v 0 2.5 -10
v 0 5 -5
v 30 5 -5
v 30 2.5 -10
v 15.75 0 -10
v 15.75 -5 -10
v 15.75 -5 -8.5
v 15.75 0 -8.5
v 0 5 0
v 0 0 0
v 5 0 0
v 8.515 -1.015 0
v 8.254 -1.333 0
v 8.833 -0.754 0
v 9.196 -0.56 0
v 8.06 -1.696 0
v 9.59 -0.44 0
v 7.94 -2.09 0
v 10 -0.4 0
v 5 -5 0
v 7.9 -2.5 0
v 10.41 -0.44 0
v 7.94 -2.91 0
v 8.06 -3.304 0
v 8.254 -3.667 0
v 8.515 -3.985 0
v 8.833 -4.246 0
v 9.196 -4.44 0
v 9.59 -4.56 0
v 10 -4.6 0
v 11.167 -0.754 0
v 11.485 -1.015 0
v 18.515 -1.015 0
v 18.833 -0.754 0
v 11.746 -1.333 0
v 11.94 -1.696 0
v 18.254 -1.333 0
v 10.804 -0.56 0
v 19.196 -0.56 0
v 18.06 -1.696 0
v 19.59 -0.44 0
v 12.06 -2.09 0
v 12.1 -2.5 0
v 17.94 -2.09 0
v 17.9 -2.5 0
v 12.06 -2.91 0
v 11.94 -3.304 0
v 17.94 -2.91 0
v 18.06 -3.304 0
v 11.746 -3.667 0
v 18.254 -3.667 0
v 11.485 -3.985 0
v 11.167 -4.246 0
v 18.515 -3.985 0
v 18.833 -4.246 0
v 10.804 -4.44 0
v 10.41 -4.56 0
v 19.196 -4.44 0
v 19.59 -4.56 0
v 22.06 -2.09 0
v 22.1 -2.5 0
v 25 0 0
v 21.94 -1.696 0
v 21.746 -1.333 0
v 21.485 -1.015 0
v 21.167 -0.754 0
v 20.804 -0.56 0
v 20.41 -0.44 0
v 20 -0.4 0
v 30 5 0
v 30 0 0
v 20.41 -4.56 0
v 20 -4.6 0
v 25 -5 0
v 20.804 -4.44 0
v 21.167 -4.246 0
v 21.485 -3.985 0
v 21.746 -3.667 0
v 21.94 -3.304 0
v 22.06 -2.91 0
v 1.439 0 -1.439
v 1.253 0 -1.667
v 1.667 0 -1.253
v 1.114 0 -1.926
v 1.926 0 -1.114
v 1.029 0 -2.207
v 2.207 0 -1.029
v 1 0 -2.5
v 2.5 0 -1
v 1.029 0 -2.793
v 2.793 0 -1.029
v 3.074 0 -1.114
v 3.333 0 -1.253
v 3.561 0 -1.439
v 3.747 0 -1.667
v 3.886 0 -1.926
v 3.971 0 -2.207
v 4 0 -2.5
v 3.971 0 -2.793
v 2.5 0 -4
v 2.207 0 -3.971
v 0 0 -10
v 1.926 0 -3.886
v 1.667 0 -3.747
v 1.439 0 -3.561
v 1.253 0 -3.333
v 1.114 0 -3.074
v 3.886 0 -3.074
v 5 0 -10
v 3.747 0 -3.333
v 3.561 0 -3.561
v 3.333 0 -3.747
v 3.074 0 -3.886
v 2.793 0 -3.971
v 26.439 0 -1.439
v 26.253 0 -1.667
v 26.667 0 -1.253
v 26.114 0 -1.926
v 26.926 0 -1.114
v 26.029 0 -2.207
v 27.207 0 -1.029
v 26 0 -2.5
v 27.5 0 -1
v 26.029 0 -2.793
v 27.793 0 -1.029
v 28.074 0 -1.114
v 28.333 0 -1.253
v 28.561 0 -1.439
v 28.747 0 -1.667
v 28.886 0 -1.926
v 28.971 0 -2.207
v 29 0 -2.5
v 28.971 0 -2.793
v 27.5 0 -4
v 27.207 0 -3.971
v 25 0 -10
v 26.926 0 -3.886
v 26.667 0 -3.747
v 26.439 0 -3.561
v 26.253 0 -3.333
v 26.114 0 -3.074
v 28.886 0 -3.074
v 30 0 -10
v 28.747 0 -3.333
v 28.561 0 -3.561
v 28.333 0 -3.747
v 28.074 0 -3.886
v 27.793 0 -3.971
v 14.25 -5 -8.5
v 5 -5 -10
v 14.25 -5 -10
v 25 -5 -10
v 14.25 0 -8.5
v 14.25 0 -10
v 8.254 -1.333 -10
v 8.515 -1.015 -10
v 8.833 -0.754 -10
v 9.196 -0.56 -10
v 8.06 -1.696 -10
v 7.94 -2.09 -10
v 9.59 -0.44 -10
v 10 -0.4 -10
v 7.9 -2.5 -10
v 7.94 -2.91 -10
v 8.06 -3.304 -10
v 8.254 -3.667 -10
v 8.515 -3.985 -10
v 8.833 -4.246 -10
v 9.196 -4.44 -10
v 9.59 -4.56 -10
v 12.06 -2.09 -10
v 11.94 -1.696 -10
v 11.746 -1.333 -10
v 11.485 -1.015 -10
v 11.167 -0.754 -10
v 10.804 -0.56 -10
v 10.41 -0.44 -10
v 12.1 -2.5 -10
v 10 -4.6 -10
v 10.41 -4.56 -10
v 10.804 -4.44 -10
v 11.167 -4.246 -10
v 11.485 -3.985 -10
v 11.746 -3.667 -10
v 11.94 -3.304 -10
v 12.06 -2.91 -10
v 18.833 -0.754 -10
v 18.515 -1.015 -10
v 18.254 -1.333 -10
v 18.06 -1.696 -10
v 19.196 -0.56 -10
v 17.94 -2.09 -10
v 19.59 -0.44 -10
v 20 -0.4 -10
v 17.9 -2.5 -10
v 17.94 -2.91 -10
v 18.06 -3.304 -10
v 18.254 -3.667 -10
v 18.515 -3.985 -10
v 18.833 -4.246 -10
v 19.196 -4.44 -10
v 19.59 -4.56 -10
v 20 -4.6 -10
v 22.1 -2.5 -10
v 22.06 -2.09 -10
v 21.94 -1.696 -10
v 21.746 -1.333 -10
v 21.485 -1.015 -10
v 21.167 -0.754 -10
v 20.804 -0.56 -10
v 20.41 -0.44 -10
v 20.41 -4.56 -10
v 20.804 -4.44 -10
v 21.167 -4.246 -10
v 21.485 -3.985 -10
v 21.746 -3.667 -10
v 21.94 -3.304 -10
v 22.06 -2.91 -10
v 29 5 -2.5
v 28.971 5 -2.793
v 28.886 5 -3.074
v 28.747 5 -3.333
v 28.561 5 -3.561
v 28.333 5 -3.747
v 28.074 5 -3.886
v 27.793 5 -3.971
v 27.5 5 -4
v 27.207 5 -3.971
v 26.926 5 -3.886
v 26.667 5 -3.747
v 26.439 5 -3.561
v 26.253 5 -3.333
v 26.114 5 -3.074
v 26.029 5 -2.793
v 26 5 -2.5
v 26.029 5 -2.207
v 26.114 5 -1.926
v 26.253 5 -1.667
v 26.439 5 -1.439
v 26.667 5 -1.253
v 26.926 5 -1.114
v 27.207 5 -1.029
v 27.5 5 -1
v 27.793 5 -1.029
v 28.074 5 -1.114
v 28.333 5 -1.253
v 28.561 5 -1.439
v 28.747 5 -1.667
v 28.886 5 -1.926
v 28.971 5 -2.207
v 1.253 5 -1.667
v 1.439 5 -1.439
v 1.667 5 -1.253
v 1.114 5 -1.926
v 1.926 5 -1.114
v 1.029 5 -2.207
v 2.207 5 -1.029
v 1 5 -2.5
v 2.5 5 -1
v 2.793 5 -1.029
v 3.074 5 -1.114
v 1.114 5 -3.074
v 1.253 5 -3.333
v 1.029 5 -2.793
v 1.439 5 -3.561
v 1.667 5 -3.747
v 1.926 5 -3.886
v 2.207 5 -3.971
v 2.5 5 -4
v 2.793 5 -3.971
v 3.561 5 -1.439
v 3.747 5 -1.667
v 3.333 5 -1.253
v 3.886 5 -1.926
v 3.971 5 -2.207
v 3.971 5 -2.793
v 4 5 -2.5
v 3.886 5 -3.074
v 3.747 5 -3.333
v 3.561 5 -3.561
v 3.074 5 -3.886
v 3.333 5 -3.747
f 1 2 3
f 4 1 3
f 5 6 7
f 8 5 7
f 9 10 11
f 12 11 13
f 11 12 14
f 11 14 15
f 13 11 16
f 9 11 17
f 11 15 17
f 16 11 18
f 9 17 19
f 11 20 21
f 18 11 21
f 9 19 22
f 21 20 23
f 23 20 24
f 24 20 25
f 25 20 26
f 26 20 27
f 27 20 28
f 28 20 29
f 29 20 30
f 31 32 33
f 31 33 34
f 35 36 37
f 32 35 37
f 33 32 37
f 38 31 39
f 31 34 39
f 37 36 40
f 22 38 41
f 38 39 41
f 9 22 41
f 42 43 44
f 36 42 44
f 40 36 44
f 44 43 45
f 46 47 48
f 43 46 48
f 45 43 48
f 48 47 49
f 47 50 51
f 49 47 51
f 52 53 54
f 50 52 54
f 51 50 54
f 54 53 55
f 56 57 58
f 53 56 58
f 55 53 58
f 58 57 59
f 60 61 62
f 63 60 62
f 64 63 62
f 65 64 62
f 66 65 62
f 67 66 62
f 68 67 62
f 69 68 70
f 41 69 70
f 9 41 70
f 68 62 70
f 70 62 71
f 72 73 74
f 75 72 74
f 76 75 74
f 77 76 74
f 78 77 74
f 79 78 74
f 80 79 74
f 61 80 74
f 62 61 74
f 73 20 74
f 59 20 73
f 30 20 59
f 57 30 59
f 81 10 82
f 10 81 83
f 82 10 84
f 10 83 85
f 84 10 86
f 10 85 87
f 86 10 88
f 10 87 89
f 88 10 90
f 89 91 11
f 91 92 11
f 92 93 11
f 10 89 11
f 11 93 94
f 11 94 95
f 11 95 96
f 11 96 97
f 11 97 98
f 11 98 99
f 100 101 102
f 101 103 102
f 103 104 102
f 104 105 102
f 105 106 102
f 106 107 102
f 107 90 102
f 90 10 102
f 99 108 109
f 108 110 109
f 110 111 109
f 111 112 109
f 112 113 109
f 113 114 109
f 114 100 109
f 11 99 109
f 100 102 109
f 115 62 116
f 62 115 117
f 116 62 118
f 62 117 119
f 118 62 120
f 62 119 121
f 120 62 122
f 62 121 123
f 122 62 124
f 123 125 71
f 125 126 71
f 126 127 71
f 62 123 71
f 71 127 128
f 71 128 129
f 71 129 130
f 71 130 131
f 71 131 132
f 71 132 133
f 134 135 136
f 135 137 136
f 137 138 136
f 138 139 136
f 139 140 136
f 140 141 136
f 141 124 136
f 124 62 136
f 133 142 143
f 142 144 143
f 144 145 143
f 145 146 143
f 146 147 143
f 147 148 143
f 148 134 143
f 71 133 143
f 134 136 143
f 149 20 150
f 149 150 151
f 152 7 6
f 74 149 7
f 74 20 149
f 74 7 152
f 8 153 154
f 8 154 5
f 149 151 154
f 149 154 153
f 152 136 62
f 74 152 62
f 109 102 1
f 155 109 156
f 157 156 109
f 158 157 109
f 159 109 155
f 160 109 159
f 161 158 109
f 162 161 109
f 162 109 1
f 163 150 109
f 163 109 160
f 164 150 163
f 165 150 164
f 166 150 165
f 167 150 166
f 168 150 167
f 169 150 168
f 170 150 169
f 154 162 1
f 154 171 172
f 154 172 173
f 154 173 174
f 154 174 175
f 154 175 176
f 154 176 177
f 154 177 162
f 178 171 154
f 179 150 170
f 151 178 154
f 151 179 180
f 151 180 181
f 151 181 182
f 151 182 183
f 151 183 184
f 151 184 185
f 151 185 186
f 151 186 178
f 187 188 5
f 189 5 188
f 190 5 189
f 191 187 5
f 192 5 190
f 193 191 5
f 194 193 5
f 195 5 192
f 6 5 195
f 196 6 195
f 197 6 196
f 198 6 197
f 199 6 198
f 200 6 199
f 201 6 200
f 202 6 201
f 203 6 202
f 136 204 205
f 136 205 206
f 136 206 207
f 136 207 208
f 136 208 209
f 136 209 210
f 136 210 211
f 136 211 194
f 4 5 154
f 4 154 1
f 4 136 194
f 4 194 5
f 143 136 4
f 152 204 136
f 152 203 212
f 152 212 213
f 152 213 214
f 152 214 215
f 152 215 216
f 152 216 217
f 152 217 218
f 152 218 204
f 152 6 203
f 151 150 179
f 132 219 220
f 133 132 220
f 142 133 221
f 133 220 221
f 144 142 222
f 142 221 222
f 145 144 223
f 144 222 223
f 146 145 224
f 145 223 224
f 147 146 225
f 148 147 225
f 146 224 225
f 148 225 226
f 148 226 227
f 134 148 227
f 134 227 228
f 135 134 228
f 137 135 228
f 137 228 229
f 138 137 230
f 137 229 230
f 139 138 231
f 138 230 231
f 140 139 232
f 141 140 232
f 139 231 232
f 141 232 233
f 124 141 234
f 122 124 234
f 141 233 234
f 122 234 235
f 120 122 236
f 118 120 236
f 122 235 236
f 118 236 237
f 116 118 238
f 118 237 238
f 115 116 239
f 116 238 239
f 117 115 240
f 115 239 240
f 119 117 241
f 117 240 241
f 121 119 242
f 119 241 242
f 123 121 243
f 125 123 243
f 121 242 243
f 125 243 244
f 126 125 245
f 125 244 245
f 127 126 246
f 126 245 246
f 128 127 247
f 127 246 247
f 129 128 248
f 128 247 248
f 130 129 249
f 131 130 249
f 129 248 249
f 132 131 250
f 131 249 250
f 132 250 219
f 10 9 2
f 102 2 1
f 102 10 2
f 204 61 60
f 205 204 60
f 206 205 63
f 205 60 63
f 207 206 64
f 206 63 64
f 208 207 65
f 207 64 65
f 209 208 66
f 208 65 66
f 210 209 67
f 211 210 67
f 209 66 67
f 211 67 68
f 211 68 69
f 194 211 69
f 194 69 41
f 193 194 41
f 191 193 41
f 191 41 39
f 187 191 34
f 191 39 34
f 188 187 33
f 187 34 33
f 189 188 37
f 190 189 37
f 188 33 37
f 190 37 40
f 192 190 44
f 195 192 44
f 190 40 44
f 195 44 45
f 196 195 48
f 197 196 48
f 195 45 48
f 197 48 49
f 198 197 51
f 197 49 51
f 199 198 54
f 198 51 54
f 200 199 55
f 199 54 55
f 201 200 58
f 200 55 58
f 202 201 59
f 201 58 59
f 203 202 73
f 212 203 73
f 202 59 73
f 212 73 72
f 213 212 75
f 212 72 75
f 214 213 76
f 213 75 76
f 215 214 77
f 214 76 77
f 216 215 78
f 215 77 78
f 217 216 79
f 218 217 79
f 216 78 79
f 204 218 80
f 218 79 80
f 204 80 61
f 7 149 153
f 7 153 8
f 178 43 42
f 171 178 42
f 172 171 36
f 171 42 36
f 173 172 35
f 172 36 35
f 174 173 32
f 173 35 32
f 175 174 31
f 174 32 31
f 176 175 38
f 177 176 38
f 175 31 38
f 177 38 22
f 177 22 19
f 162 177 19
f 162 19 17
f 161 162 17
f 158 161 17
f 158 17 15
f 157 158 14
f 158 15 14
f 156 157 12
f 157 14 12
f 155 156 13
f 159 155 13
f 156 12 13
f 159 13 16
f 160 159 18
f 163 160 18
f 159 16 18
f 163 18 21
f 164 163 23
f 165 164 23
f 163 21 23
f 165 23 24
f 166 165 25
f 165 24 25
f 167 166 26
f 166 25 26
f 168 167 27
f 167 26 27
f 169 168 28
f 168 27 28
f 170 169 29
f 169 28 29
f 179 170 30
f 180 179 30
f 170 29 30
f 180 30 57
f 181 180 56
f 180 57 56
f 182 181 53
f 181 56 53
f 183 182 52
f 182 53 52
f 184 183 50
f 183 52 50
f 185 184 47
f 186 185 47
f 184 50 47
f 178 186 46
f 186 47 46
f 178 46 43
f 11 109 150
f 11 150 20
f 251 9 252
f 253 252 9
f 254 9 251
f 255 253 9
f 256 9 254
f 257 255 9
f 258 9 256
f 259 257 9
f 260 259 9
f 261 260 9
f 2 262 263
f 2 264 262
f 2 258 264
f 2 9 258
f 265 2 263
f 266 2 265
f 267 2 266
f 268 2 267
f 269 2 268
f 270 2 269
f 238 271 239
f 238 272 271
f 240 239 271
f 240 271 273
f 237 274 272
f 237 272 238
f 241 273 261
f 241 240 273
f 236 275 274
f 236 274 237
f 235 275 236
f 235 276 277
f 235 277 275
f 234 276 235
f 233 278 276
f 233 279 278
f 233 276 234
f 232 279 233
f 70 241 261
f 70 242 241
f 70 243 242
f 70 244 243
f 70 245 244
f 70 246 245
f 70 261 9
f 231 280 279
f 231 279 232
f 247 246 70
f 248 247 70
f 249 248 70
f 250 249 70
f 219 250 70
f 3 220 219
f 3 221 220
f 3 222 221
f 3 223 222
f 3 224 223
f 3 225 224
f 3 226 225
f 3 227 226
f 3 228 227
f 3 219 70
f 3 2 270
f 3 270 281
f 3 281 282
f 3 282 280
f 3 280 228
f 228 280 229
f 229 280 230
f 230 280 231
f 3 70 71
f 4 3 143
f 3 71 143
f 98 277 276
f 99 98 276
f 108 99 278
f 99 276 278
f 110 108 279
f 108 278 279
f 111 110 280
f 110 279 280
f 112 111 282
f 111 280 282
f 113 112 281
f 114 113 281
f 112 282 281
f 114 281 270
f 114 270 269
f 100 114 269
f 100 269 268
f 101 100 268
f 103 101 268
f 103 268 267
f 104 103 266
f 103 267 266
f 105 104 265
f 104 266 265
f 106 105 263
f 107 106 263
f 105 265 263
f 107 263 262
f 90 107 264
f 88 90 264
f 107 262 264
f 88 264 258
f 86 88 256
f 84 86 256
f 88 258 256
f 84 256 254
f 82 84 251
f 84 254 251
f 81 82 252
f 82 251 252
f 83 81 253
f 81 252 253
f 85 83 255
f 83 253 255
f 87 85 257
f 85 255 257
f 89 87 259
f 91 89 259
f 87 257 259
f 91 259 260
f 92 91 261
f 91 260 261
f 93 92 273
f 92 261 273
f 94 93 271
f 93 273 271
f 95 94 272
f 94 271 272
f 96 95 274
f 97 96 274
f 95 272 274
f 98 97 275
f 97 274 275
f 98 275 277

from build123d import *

# Parameters (mm, degrees)
SKETCH1_W           = 30
SKETCH1_H           = 10
BOSS_EXTRUDE1_DEPTH = 5
SKETCH2_W           = 20
SKETCH2_H           = 10
BOSS_EXTRUDE2_DEPTH = 5
SKETCH3_R           = 2.1
CUT_EXTRUDE1_DEPTH  = 10
LPATTERN1_COUNT     = 2
LPATTERN1_PITCH     = 10
SKETCH4_R           = 1.5
CUT_EXTRUDE2_DEPTH  = 5
LPATTERN2_COUNT     = 2
LPATTERN2_PITCH     = 25
SKETCH5_W           = 1.5
SKETCH5_H           = 1.5
CUT_EXTRUDE3_DEPTH  = 5
CHAMFER1_SIZE       = 2.5
CHAMFER1_SIZE2      = 5


with BuildPart() as part:
    # Sketch1 → Boss-Extrude1 (new body)
    with BuildSketch(Plane(origin=(0, 0, 0), x_dir=(1, 0, 0), z_dir=(0, 1, 0))):
        with Locations((15, 5)):
            Rectangle(SKETCH1_W, SKETCH1_H)
    extrude(amount=BOSS_EXTRUDE1_DEPTH)

    # Sketch2 → Boss-Extrude2 (add)
    with BuildSketch(Plane.XZ):
        with Locations((15, -5)):
            Rectangle(SKETCH2_W, SKETCH2_H)
    extrude(amount=BOSS_EXTRUDE2_DEPTH)

    # Sketch3 → Cut-Extrude1 (cut)
    with BuildSketch(Plane.XY):
        with Locations((20, -2.5)):
            Circle(SKETCH3_R)
    cut_extrude1 = extrude(amount=-CUT_EXTRUDE1_DEPTH, mode=Mode.SUBTRACT)

    # LPattern1: Cut-Extrude1 ×2
    with Locations(*[(-i * LPATTERN1_PITCH, 0, 0) for i in range(1, LPATTERN1_COUNT)]):
        add(cut_extrude1, mode=Mode.SUBTRACT)

    # Sketch4 → Cut-Extrude2 (cut)
    with BuildSketch(Plane(origin=(0, 5, 0), x_dir=(1, 0, 0), z_dir=(0, 1, 0))):
        with Locations((27.5, 2.5)):
            Circle(SKETCH4_R)
    cut_extrude2 = extrude(amount=-CUT_EXTRUDE2_DEPTH, mode=Mode.SUBTRACT)

    # LPattern2: Cut-Extrude2 ×2
    with Locations(*[(-i * LPATTERN2_PITCH, 0, 0) for i in range(1, LPATTERN2_COUNT)]):
        add(cut_extrude2, mode=Mode.SUBTRACT)

    # Sketch5 → Cut-Extrude3 (cut)
    with BuildSketch(Plane.XZ.offset(5)):
        with Locations((15, -9.25)):
            Rectangle(SKETCH5_W, SKETCH5_H)
    extrude(amount=-CUT_EXTRUDE3_DEPTH, mode=Mode.SUBTRACT)

    # Chamfer1
    chamfer1_edges = [part.edges().sort_by_distance(p)[0] for p in [
        (15, 5, -10),
    ]]
    chamfer1_side = [part.faces().sort_by_distance(p)[0] for p in [
        (15, 0.991763931, -10),
    ]]
    chamfer(chamfer1_edges, length=CHAMFER1_SIZE, length2=CHAMFER1_SIZE2, reference=chamfer1_side[0])


solid = part.part
